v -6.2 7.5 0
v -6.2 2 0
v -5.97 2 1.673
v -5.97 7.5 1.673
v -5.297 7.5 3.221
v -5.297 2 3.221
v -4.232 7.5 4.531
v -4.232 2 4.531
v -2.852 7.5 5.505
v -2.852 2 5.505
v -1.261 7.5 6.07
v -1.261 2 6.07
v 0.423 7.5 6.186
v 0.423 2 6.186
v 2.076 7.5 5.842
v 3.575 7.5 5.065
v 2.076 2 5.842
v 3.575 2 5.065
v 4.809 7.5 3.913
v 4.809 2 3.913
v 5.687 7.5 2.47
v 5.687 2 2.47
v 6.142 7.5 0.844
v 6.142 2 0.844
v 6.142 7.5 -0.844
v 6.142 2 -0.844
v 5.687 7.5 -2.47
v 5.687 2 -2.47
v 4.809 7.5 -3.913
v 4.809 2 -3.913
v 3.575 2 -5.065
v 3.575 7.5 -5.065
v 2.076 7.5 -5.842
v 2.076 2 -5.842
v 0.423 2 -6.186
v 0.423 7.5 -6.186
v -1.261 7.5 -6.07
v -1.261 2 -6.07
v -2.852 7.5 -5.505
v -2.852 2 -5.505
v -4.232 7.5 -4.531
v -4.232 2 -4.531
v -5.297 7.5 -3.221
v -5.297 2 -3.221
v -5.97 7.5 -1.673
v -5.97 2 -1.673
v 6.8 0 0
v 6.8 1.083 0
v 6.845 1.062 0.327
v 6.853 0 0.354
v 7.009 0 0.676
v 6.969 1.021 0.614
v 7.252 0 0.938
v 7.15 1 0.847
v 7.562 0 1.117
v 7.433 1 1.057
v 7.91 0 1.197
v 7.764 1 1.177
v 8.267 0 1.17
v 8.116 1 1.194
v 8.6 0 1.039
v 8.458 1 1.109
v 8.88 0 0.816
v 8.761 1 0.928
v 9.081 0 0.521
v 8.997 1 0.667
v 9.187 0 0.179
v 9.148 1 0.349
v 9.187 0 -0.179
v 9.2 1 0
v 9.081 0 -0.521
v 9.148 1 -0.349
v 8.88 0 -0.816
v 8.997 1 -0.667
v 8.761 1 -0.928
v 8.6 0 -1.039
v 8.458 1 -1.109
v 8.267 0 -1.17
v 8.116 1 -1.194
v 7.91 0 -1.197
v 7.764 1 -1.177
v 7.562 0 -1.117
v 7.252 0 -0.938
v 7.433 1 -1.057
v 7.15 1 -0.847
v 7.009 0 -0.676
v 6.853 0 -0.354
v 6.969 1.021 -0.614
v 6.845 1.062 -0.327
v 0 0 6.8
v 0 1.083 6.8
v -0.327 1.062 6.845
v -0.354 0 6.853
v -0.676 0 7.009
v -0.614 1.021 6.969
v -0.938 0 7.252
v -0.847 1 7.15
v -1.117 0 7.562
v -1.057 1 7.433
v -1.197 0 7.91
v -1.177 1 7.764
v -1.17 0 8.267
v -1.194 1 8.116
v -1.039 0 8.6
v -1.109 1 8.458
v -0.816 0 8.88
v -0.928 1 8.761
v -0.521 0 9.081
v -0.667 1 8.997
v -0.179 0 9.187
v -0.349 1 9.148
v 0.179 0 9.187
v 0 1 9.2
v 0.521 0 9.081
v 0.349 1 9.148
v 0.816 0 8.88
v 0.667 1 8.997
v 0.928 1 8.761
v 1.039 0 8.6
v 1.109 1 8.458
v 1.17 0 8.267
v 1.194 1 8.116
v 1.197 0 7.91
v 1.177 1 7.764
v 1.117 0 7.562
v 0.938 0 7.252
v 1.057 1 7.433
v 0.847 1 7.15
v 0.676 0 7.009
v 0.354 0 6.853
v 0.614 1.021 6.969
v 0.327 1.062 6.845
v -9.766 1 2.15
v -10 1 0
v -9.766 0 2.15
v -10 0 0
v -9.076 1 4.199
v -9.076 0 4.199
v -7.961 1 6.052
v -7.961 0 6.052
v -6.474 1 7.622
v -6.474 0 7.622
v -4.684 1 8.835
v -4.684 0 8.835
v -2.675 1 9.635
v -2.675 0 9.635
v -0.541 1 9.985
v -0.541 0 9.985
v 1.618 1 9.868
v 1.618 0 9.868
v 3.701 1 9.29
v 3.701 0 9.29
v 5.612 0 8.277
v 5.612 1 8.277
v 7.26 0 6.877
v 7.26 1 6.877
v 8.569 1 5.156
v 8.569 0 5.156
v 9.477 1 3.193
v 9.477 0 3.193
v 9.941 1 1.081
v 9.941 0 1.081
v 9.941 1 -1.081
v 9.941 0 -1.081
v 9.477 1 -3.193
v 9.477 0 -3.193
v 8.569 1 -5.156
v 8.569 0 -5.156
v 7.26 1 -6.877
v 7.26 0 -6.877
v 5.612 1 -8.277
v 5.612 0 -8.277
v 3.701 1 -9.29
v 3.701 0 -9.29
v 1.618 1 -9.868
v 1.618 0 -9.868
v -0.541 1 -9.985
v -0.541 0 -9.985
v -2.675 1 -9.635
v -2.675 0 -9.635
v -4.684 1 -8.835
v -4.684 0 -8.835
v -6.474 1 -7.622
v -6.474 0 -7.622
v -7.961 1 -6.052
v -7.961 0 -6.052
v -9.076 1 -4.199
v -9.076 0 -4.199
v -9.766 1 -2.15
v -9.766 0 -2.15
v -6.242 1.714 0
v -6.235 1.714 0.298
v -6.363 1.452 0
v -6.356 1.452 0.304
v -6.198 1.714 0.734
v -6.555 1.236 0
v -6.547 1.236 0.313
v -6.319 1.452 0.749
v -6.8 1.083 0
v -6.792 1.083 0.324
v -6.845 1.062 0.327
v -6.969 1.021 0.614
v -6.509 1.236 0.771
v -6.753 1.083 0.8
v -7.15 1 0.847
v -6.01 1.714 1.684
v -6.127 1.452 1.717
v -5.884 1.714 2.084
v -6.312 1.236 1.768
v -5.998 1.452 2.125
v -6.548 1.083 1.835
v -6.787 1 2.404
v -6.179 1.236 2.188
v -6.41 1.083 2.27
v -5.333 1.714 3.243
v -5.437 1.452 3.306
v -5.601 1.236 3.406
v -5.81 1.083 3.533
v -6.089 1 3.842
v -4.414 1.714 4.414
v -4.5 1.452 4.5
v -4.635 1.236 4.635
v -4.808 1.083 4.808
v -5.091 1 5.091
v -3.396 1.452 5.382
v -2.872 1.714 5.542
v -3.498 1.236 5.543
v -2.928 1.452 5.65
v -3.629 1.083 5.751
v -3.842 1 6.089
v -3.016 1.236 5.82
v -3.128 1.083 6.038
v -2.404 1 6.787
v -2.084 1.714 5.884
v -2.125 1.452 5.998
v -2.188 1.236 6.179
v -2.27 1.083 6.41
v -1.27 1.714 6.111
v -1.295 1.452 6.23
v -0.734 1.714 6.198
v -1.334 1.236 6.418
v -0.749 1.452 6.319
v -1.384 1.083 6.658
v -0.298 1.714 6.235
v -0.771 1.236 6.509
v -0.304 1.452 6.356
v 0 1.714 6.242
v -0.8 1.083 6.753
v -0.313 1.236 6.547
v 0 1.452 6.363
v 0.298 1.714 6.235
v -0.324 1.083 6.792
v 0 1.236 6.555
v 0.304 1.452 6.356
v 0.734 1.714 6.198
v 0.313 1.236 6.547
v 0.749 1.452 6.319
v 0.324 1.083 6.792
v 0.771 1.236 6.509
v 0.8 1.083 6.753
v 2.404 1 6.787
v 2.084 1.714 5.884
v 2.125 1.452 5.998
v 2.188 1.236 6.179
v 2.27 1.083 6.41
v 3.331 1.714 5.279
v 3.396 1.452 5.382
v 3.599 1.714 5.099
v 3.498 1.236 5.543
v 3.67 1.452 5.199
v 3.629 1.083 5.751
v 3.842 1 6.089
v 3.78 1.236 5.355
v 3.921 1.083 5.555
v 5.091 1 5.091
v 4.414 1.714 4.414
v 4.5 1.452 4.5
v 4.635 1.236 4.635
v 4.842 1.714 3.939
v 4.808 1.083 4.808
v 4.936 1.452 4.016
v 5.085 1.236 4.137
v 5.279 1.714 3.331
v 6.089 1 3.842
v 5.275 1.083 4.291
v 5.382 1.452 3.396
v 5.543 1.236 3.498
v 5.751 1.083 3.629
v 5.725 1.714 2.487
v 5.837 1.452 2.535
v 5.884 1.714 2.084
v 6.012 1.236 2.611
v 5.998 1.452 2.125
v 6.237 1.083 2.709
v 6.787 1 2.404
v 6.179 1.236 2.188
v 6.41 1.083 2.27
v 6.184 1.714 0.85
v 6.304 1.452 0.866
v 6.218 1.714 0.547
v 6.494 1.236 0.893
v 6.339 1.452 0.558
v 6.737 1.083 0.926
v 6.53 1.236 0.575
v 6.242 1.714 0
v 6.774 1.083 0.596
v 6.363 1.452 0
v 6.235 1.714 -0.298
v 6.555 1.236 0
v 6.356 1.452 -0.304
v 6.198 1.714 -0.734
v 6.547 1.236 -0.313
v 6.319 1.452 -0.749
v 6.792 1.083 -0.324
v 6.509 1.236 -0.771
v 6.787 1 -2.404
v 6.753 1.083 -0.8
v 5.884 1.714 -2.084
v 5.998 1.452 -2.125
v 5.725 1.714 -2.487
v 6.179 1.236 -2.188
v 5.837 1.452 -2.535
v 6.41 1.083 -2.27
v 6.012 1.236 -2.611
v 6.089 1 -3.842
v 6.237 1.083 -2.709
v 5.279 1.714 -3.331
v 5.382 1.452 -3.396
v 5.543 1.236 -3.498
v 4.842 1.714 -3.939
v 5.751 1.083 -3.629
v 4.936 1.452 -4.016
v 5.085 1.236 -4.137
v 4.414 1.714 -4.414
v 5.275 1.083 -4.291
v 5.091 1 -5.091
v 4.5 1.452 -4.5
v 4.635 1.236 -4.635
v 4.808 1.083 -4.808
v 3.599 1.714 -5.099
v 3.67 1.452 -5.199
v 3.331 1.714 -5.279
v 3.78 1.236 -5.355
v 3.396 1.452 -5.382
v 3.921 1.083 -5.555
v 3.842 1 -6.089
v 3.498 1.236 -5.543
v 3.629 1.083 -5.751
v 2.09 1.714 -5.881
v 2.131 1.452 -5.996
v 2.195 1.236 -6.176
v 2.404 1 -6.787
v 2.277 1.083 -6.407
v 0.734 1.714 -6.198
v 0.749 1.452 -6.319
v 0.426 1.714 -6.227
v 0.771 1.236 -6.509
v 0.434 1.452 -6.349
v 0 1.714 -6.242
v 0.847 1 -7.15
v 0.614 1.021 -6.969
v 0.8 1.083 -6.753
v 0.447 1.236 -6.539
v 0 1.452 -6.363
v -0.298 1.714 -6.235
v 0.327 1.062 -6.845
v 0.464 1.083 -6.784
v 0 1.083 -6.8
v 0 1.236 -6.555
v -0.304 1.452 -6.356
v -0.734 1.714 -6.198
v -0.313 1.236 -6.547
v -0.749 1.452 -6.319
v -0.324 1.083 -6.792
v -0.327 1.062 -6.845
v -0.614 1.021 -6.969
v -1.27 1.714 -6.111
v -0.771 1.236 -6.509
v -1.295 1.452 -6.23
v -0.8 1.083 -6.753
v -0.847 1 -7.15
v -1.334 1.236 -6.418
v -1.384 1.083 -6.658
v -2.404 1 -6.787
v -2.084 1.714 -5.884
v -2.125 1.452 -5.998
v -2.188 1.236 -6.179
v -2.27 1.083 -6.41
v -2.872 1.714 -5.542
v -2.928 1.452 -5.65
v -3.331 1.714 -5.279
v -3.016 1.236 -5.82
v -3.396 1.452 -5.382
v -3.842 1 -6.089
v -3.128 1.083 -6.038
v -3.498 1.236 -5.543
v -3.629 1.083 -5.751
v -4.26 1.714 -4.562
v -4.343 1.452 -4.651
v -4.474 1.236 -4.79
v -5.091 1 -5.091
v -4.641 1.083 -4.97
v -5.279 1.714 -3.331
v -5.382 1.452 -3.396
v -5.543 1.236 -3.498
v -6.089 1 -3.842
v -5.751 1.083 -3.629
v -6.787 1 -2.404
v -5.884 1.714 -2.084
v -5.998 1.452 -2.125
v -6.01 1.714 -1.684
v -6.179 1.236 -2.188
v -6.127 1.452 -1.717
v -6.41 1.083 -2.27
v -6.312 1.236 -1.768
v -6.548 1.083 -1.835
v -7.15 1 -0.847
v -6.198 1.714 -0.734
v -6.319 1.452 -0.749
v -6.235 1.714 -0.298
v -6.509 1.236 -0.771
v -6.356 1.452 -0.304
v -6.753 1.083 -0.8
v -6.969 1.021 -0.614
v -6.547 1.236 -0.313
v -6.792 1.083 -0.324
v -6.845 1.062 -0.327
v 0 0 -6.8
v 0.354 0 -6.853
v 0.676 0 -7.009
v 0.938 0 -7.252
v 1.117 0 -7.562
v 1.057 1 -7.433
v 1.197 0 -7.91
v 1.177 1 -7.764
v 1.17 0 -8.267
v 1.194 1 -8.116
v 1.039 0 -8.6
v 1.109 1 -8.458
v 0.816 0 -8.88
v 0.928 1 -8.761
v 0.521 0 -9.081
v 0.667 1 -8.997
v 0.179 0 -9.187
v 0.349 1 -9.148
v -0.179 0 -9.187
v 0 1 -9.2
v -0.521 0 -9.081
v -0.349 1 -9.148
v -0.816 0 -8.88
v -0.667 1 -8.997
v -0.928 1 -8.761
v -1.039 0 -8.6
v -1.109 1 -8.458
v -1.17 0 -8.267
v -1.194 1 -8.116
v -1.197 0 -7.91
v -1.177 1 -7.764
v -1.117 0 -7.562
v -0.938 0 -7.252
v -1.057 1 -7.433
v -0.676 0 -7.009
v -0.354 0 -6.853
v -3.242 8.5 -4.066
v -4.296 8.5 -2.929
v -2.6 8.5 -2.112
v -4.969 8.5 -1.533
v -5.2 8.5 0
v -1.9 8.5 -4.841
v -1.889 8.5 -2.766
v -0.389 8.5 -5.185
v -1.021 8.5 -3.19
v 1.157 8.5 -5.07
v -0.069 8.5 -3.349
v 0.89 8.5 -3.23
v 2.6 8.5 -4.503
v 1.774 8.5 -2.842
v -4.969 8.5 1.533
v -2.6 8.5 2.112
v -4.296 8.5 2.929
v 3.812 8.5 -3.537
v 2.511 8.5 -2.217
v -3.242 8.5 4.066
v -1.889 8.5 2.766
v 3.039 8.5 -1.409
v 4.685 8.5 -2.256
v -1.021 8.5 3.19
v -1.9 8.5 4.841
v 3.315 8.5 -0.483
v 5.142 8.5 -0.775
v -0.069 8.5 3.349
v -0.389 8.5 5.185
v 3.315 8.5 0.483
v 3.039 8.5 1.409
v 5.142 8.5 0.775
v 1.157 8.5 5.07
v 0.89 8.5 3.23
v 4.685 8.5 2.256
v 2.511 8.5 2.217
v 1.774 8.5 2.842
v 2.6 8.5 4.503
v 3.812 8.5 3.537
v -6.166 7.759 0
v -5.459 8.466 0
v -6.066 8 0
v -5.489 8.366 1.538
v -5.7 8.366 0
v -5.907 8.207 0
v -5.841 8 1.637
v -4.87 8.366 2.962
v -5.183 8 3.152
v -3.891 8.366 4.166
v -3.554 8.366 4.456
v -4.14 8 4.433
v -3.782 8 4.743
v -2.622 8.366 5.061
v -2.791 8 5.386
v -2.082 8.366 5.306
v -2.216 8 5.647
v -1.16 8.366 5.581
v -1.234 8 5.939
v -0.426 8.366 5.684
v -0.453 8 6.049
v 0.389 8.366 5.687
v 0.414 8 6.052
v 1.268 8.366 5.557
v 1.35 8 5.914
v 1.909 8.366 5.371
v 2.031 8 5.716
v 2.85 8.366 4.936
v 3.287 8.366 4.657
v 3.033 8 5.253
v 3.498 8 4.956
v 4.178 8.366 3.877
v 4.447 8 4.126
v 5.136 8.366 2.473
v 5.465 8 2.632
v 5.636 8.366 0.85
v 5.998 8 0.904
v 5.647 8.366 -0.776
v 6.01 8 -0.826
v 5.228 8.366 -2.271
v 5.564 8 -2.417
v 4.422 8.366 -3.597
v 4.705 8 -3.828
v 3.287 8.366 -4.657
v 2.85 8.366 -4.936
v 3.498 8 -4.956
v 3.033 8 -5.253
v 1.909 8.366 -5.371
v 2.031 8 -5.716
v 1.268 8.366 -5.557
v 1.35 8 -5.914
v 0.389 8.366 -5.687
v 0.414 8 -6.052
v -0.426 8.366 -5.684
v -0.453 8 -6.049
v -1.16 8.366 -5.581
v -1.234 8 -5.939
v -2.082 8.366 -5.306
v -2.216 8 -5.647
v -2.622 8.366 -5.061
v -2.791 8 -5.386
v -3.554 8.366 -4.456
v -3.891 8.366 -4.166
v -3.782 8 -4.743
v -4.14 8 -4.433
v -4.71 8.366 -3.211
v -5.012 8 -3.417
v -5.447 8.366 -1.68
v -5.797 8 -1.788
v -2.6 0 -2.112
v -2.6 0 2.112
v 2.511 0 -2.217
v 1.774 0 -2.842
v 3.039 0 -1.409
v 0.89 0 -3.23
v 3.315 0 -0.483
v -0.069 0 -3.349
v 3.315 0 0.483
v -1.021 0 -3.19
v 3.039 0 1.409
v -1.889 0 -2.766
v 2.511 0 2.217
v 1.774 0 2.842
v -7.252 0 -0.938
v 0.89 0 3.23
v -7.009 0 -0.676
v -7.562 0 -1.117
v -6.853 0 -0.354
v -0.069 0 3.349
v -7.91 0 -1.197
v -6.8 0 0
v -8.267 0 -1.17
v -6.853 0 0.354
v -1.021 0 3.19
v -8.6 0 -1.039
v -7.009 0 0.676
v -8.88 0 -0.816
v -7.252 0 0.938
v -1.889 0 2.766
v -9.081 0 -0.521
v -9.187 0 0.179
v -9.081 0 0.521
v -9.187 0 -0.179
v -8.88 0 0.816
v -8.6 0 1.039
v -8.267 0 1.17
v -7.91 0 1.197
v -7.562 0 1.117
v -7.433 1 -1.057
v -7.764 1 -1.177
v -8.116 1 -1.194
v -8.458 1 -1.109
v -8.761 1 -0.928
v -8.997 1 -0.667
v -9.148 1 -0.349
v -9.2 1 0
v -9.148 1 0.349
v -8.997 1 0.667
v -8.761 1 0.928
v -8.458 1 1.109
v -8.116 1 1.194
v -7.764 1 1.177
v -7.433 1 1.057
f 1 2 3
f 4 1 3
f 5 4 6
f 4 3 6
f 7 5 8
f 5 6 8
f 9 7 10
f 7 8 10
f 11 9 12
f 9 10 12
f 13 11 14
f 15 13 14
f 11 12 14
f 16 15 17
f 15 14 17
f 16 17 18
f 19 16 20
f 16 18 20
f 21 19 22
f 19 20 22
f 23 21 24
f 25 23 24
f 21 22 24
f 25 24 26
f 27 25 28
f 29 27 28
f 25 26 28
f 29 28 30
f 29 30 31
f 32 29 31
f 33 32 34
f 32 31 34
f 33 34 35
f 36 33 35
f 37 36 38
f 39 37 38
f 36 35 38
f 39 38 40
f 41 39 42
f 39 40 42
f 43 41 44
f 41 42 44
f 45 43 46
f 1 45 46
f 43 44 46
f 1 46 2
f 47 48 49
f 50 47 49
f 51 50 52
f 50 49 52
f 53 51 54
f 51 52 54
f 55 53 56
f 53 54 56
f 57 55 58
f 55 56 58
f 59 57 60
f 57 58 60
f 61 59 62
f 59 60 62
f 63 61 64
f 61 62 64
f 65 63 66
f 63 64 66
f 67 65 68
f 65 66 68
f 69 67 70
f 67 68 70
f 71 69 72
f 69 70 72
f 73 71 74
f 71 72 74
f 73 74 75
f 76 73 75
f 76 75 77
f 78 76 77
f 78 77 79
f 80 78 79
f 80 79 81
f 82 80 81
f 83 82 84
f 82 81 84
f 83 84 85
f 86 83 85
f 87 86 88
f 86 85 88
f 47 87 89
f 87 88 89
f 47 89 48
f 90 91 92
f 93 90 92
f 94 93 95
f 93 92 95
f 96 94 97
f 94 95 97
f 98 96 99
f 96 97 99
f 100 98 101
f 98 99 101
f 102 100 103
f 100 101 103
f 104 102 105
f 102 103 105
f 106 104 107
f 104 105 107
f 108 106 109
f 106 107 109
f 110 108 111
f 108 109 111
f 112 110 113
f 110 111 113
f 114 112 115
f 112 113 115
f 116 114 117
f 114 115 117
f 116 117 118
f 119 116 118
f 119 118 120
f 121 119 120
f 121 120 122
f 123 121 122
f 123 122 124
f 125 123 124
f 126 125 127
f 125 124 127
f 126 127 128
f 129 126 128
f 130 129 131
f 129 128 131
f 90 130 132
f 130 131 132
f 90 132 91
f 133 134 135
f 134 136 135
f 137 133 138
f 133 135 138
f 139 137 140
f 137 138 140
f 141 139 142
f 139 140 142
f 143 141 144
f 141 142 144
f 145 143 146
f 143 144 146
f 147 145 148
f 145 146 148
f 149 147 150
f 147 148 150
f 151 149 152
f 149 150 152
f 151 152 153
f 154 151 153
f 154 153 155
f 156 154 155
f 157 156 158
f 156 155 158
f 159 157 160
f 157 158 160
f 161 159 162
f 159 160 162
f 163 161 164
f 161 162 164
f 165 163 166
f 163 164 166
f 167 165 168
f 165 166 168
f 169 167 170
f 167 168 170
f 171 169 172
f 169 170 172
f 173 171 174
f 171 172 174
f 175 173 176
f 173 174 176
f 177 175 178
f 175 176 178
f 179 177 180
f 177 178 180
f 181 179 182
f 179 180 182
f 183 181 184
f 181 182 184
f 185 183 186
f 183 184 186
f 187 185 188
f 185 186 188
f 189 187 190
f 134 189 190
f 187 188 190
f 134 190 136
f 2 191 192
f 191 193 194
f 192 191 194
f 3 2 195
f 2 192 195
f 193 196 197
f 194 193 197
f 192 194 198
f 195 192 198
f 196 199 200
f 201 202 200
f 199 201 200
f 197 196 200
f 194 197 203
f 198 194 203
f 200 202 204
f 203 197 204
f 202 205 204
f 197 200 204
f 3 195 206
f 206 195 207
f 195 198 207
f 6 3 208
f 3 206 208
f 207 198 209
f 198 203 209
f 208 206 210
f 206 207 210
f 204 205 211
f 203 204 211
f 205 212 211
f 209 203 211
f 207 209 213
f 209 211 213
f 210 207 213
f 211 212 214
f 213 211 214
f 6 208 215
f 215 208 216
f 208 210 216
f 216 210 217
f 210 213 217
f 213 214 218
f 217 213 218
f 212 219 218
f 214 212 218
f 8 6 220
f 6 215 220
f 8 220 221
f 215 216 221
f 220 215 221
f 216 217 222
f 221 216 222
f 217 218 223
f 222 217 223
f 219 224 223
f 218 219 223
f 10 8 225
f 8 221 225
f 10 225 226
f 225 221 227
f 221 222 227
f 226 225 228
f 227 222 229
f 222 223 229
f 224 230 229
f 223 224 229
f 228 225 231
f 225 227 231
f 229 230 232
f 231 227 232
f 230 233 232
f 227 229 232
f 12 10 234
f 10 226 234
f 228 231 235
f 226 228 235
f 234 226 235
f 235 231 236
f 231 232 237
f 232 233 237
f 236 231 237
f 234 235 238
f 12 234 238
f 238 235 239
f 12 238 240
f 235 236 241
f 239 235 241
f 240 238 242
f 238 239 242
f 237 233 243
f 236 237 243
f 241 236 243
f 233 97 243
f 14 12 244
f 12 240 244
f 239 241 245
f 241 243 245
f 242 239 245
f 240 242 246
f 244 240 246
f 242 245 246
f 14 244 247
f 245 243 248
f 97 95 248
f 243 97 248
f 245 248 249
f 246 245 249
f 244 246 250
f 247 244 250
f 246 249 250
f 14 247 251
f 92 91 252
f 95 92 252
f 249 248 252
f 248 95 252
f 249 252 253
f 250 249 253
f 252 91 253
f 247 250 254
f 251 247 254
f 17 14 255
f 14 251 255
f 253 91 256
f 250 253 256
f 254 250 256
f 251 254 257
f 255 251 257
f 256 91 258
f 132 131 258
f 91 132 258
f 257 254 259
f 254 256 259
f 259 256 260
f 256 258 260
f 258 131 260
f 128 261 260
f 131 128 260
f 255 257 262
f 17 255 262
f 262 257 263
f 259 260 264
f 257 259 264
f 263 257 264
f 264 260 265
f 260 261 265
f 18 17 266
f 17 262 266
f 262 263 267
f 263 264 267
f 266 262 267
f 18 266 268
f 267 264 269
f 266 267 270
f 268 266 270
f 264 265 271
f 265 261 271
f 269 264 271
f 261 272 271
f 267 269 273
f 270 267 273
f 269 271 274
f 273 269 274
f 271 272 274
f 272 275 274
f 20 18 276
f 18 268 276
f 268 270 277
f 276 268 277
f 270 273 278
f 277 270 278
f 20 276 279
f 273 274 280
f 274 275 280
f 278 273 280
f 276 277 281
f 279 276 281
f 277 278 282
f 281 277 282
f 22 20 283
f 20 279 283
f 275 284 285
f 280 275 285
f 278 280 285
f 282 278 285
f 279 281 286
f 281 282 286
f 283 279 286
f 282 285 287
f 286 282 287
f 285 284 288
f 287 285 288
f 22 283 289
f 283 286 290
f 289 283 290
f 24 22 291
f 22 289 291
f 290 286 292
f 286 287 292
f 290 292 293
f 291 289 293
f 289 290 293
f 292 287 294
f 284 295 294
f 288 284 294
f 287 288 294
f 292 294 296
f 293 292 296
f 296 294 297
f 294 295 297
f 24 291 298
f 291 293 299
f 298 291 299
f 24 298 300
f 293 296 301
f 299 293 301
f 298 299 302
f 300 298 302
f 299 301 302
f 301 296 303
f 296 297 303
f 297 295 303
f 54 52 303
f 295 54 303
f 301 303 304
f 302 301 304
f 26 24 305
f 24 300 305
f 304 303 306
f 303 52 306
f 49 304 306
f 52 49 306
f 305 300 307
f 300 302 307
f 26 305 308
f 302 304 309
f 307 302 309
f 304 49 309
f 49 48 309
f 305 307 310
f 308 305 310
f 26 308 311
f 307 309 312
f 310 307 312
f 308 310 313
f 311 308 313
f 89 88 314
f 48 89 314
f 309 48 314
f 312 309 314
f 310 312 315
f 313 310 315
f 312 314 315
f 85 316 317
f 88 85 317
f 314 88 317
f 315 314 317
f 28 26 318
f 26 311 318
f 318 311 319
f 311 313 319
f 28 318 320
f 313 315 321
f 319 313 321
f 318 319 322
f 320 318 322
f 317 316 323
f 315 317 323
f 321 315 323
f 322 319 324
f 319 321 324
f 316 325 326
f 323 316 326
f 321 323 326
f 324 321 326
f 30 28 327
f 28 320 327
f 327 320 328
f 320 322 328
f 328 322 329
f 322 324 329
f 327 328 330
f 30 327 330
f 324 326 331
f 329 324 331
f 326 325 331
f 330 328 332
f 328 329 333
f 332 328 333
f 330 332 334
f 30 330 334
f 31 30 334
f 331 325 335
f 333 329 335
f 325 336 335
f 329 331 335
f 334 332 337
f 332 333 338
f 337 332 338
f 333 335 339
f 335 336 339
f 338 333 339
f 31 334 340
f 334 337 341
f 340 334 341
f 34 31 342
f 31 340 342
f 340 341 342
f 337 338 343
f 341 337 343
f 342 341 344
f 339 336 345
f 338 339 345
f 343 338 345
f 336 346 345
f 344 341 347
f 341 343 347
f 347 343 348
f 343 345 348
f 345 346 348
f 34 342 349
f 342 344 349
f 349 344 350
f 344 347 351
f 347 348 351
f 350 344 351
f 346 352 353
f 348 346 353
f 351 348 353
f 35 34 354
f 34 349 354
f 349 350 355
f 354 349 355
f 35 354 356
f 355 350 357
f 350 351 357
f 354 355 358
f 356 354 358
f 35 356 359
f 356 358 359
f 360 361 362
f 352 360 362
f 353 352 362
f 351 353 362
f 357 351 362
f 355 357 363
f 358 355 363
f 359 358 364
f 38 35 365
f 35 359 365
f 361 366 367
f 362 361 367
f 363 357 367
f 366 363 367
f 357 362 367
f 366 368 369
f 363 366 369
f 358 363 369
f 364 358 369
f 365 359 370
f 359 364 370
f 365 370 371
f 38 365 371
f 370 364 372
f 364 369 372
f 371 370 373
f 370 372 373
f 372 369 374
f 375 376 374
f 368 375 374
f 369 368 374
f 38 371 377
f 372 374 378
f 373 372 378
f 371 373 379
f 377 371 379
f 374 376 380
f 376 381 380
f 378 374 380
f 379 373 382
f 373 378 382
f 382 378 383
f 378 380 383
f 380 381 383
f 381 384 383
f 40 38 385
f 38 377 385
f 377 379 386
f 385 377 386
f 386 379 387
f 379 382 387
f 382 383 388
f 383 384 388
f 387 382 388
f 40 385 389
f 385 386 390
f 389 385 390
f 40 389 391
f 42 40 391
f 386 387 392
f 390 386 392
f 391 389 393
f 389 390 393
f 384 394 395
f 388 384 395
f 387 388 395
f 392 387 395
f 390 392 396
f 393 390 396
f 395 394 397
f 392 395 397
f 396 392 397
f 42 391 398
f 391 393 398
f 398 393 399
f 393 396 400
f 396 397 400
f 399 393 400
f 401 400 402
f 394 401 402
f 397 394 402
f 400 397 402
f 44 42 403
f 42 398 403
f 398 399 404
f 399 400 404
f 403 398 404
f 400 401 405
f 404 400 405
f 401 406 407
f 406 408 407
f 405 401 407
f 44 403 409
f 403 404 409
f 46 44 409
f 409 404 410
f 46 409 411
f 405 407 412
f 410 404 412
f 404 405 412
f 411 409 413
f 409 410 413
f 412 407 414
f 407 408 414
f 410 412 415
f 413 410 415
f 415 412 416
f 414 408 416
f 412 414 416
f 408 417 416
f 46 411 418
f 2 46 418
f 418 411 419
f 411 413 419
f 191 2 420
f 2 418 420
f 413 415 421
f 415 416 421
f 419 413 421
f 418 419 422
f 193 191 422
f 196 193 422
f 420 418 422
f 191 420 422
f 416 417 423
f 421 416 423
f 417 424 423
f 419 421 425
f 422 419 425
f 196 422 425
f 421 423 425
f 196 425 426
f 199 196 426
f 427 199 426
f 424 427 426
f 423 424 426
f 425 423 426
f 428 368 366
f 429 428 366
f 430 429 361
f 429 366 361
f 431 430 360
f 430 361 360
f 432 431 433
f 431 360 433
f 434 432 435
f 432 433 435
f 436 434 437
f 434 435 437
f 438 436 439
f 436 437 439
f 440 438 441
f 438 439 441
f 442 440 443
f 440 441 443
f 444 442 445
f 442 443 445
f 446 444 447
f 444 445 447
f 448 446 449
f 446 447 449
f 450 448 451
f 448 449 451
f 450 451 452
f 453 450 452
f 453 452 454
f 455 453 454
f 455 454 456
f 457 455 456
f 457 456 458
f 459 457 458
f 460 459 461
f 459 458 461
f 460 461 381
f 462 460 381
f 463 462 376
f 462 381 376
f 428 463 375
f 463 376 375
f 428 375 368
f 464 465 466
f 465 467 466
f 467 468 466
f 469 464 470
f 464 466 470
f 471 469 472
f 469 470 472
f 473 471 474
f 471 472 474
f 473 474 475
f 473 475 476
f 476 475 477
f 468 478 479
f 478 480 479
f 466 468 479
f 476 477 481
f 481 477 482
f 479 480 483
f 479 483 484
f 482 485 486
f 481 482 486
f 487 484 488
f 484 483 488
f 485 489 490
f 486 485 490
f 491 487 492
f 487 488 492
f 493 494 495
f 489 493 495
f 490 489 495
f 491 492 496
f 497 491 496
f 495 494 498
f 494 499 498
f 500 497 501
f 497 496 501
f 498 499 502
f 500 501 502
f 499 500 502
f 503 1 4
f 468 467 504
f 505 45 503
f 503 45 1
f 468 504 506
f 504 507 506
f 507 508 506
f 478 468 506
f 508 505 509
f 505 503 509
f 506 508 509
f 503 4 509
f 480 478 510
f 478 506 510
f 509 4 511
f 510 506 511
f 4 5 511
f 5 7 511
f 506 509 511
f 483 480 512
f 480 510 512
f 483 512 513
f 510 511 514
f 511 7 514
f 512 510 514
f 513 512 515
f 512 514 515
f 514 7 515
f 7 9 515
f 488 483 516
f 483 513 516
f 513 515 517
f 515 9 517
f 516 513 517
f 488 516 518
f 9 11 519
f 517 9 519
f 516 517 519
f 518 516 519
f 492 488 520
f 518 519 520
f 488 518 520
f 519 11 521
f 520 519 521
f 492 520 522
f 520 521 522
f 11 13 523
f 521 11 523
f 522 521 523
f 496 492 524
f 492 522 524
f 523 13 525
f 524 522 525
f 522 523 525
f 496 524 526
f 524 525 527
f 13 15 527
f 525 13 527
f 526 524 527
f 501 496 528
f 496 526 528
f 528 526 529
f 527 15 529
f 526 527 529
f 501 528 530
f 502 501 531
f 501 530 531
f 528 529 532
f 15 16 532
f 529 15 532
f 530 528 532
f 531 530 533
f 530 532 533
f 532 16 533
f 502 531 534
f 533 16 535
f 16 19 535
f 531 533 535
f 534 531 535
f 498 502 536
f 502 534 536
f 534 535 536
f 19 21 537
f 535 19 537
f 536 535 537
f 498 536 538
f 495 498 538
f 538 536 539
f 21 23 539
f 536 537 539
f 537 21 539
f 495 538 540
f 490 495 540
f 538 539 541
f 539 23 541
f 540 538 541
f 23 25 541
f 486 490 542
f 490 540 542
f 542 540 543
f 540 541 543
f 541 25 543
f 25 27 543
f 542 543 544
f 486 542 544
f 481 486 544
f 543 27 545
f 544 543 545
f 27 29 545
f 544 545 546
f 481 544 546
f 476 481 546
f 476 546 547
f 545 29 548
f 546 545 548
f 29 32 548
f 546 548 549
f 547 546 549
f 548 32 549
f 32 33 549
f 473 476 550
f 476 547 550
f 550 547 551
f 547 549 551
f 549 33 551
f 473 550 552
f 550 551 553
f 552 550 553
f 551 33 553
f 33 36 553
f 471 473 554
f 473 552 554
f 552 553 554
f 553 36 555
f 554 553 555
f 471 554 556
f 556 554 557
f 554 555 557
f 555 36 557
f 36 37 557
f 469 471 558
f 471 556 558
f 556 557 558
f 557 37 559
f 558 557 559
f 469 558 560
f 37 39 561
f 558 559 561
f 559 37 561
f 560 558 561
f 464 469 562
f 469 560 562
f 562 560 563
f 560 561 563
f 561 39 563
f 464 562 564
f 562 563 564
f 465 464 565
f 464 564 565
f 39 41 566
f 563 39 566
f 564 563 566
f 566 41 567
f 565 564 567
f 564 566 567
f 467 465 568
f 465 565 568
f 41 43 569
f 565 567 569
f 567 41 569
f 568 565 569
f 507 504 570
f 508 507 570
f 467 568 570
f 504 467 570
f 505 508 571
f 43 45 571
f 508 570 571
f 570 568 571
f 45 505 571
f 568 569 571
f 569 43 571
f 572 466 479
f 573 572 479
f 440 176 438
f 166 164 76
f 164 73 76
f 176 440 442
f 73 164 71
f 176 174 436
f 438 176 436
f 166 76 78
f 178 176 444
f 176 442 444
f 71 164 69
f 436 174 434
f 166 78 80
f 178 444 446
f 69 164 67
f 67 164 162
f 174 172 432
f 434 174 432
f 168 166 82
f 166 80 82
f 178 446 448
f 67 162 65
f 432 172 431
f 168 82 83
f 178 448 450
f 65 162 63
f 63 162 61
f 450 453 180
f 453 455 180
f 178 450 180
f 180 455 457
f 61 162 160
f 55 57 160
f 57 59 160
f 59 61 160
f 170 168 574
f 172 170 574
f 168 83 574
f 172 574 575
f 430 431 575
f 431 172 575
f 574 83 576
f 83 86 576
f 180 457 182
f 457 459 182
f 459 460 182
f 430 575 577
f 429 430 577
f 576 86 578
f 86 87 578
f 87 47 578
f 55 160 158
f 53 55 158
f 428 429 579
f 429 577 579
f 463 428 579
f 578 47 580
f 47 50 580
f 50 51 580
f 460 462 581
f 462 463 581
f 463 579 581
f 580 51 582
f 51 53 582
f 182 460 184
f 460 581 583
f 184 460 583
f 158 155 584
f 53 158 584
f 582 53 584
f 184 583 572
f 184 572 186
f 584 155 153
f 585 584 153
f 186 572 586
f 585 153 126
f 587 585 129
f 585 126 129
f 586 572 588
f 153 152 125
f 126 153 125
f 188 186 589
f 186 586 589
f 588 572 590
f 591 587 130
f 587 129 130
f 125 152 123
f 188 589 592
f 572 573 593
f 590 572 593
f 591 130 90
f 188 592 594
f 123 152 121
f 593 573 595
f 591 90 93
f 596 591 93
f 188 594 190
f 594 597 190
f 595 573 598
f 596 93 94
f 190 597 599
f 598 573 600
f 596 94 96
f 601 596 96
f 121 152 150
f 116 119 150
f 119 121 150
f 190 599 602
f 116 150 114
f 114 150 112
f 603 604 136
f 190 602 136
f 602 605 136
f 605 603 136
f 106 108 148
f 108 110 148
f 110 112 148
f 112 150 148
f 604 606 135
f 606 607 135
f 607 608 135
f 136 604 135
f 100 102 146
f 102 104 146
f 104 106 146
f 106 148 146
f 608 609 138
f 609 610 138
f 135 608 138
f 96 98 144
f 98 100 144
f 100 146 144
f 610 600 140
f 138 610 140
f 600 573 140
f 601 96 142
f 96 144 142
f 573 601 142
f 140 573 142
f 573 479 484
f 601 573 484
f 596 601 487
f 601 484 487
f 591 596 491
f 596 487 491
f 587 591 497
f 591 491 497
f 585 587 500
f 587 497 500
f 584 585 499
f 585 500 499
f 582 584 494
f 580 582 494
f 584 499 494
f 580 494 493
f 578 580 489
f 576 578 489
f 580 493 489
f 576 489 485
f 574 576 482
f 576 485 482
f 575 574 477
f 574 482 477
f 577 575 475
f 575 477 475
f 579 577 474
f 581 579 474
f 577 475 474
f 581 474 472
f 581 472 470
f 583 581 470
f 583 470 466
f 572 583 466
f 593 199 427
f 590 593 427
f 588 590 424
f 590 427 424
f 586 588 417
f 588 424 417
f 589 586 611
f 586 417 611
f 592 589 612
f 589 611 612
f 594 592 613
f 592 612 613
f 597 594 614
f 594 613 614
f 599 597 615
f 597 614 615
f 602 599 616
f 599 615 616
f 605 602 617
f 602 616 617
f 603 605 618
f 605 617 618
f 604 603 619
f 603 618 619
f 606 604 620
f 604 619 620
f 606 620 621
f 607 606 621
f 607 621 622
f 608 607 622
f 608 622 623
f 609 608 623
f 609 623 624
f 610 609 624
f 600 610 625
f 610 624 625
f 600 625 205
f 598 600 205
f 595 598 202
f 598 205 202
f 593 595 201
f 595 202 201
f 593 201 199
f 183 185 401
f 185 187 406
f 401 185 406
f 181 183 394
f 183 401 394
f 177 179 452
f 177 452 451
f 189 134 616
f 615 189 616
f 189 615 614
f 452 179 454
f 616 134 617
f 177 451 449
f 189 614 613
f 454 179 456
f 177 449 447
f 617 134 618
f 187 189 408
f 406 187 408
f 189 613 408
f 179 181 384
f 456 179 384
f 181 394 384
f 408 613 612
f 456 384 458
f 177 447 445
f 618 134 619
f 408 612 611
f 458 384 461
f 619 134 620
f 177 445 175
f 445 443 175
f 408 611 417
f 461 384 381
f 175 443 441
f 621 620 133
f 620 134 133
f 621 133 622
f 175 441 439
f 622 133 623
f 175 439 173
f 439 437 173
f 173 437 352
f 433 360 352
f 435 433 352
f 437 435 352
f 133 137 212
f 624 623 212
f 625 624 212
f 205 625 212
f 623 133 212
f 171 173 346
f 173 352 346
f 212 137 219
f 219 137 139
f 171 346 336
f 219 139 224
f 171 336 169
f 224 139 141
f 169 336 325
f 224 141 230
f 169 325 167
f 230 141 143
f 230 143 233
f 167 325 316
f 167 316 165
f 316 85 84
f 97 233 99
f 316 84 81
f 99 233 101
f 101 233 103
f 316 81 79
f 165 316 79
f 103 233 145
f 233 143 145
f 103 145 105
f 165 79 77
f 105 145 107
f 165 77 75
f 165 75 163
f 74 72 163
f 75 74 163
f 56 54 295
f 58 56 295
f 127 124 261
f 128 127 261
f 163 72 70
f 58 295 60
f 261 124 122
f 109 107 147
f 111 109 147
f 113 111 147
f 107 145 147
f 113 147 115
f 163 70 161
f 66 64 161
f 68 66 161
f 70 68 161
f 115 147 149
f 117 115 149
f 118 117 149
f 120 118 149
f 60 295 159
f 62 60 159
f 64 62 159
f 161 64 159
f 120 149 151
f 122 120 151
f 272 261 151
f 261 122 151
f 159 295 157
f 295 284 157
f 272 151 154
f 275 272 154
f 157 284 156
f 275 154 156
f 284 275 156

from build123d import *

# Parameters (mm, degrees)
CUT_EXTRUDE1_DEPTH   = 10
FILLET1_R            = 1
M2_CLEARANCE_HOLE2_D = 2.4
CIRPATTERN1_COUNT    = 4


with BuildPart() as part:
    # Sketch2 → Revolve1 (revolve)
    with BuildSketch(Plane.XY):
        Polygon((0, 0), (0, 8.5), (-6.2, 8.5), (-6.2, 1), (-10, 1), (-10, 0), align=None)
    revolve(axis=Axis((0, 0, 0), (0, 1, 0)))

    # Sketch3 → Cut-Extrude1 (cut)
    with BuildSketch(Plane(origin=(0, 8.5, 0), x_dir=(1, 0, 0), z_dir=(0, 1, 0))):
        with BuildLine():
            Line((-2.6, 2.112463017), (-2.6, -2.112463017))
            ThreePointArc((-2.6, -2.112463017), (3.35, 0), (-2.6, 2.112463017))
        make_face()
    extrude(amount=-CUT_EXTRUDE1_DEPTH, mode=Mode.SUBTRACT)

    # Fillet1
    fillet1_edges = [part.edges().sort_by_distance(p)[0] for p in [
        (6.2, 1, 0),
        (6.2, 8.5, 0),
    ]]
    fillet(fillet1_edges, radius=FILLET1_R)

    # M2 Clearance Hole2 (through all)
    with Locations(Plane(origin=(0, 0, 0), x_dir=(-1, 0, 0), z_dir=(0, -1, 0))):
        with Locations((8, 0)):
            m2_clearance_hole2 = Hole(M2_CLEARANCE_HOLE2_D / 2)

    # CirPattern1: M2 Clearance Hole2 ×4 about axis
    cirpattern1_axis = Axis((0, 0, 0), (0, 1, 0))
    for i in range(1, CIRPATTERN1_COUNT):
        add(m2_clearance_hole2.rotate(cirpattern1_axis, i * 360 / CIRPATTERN1_COUNT), mode=Mode.SUBTRACT)


solid = part.part
